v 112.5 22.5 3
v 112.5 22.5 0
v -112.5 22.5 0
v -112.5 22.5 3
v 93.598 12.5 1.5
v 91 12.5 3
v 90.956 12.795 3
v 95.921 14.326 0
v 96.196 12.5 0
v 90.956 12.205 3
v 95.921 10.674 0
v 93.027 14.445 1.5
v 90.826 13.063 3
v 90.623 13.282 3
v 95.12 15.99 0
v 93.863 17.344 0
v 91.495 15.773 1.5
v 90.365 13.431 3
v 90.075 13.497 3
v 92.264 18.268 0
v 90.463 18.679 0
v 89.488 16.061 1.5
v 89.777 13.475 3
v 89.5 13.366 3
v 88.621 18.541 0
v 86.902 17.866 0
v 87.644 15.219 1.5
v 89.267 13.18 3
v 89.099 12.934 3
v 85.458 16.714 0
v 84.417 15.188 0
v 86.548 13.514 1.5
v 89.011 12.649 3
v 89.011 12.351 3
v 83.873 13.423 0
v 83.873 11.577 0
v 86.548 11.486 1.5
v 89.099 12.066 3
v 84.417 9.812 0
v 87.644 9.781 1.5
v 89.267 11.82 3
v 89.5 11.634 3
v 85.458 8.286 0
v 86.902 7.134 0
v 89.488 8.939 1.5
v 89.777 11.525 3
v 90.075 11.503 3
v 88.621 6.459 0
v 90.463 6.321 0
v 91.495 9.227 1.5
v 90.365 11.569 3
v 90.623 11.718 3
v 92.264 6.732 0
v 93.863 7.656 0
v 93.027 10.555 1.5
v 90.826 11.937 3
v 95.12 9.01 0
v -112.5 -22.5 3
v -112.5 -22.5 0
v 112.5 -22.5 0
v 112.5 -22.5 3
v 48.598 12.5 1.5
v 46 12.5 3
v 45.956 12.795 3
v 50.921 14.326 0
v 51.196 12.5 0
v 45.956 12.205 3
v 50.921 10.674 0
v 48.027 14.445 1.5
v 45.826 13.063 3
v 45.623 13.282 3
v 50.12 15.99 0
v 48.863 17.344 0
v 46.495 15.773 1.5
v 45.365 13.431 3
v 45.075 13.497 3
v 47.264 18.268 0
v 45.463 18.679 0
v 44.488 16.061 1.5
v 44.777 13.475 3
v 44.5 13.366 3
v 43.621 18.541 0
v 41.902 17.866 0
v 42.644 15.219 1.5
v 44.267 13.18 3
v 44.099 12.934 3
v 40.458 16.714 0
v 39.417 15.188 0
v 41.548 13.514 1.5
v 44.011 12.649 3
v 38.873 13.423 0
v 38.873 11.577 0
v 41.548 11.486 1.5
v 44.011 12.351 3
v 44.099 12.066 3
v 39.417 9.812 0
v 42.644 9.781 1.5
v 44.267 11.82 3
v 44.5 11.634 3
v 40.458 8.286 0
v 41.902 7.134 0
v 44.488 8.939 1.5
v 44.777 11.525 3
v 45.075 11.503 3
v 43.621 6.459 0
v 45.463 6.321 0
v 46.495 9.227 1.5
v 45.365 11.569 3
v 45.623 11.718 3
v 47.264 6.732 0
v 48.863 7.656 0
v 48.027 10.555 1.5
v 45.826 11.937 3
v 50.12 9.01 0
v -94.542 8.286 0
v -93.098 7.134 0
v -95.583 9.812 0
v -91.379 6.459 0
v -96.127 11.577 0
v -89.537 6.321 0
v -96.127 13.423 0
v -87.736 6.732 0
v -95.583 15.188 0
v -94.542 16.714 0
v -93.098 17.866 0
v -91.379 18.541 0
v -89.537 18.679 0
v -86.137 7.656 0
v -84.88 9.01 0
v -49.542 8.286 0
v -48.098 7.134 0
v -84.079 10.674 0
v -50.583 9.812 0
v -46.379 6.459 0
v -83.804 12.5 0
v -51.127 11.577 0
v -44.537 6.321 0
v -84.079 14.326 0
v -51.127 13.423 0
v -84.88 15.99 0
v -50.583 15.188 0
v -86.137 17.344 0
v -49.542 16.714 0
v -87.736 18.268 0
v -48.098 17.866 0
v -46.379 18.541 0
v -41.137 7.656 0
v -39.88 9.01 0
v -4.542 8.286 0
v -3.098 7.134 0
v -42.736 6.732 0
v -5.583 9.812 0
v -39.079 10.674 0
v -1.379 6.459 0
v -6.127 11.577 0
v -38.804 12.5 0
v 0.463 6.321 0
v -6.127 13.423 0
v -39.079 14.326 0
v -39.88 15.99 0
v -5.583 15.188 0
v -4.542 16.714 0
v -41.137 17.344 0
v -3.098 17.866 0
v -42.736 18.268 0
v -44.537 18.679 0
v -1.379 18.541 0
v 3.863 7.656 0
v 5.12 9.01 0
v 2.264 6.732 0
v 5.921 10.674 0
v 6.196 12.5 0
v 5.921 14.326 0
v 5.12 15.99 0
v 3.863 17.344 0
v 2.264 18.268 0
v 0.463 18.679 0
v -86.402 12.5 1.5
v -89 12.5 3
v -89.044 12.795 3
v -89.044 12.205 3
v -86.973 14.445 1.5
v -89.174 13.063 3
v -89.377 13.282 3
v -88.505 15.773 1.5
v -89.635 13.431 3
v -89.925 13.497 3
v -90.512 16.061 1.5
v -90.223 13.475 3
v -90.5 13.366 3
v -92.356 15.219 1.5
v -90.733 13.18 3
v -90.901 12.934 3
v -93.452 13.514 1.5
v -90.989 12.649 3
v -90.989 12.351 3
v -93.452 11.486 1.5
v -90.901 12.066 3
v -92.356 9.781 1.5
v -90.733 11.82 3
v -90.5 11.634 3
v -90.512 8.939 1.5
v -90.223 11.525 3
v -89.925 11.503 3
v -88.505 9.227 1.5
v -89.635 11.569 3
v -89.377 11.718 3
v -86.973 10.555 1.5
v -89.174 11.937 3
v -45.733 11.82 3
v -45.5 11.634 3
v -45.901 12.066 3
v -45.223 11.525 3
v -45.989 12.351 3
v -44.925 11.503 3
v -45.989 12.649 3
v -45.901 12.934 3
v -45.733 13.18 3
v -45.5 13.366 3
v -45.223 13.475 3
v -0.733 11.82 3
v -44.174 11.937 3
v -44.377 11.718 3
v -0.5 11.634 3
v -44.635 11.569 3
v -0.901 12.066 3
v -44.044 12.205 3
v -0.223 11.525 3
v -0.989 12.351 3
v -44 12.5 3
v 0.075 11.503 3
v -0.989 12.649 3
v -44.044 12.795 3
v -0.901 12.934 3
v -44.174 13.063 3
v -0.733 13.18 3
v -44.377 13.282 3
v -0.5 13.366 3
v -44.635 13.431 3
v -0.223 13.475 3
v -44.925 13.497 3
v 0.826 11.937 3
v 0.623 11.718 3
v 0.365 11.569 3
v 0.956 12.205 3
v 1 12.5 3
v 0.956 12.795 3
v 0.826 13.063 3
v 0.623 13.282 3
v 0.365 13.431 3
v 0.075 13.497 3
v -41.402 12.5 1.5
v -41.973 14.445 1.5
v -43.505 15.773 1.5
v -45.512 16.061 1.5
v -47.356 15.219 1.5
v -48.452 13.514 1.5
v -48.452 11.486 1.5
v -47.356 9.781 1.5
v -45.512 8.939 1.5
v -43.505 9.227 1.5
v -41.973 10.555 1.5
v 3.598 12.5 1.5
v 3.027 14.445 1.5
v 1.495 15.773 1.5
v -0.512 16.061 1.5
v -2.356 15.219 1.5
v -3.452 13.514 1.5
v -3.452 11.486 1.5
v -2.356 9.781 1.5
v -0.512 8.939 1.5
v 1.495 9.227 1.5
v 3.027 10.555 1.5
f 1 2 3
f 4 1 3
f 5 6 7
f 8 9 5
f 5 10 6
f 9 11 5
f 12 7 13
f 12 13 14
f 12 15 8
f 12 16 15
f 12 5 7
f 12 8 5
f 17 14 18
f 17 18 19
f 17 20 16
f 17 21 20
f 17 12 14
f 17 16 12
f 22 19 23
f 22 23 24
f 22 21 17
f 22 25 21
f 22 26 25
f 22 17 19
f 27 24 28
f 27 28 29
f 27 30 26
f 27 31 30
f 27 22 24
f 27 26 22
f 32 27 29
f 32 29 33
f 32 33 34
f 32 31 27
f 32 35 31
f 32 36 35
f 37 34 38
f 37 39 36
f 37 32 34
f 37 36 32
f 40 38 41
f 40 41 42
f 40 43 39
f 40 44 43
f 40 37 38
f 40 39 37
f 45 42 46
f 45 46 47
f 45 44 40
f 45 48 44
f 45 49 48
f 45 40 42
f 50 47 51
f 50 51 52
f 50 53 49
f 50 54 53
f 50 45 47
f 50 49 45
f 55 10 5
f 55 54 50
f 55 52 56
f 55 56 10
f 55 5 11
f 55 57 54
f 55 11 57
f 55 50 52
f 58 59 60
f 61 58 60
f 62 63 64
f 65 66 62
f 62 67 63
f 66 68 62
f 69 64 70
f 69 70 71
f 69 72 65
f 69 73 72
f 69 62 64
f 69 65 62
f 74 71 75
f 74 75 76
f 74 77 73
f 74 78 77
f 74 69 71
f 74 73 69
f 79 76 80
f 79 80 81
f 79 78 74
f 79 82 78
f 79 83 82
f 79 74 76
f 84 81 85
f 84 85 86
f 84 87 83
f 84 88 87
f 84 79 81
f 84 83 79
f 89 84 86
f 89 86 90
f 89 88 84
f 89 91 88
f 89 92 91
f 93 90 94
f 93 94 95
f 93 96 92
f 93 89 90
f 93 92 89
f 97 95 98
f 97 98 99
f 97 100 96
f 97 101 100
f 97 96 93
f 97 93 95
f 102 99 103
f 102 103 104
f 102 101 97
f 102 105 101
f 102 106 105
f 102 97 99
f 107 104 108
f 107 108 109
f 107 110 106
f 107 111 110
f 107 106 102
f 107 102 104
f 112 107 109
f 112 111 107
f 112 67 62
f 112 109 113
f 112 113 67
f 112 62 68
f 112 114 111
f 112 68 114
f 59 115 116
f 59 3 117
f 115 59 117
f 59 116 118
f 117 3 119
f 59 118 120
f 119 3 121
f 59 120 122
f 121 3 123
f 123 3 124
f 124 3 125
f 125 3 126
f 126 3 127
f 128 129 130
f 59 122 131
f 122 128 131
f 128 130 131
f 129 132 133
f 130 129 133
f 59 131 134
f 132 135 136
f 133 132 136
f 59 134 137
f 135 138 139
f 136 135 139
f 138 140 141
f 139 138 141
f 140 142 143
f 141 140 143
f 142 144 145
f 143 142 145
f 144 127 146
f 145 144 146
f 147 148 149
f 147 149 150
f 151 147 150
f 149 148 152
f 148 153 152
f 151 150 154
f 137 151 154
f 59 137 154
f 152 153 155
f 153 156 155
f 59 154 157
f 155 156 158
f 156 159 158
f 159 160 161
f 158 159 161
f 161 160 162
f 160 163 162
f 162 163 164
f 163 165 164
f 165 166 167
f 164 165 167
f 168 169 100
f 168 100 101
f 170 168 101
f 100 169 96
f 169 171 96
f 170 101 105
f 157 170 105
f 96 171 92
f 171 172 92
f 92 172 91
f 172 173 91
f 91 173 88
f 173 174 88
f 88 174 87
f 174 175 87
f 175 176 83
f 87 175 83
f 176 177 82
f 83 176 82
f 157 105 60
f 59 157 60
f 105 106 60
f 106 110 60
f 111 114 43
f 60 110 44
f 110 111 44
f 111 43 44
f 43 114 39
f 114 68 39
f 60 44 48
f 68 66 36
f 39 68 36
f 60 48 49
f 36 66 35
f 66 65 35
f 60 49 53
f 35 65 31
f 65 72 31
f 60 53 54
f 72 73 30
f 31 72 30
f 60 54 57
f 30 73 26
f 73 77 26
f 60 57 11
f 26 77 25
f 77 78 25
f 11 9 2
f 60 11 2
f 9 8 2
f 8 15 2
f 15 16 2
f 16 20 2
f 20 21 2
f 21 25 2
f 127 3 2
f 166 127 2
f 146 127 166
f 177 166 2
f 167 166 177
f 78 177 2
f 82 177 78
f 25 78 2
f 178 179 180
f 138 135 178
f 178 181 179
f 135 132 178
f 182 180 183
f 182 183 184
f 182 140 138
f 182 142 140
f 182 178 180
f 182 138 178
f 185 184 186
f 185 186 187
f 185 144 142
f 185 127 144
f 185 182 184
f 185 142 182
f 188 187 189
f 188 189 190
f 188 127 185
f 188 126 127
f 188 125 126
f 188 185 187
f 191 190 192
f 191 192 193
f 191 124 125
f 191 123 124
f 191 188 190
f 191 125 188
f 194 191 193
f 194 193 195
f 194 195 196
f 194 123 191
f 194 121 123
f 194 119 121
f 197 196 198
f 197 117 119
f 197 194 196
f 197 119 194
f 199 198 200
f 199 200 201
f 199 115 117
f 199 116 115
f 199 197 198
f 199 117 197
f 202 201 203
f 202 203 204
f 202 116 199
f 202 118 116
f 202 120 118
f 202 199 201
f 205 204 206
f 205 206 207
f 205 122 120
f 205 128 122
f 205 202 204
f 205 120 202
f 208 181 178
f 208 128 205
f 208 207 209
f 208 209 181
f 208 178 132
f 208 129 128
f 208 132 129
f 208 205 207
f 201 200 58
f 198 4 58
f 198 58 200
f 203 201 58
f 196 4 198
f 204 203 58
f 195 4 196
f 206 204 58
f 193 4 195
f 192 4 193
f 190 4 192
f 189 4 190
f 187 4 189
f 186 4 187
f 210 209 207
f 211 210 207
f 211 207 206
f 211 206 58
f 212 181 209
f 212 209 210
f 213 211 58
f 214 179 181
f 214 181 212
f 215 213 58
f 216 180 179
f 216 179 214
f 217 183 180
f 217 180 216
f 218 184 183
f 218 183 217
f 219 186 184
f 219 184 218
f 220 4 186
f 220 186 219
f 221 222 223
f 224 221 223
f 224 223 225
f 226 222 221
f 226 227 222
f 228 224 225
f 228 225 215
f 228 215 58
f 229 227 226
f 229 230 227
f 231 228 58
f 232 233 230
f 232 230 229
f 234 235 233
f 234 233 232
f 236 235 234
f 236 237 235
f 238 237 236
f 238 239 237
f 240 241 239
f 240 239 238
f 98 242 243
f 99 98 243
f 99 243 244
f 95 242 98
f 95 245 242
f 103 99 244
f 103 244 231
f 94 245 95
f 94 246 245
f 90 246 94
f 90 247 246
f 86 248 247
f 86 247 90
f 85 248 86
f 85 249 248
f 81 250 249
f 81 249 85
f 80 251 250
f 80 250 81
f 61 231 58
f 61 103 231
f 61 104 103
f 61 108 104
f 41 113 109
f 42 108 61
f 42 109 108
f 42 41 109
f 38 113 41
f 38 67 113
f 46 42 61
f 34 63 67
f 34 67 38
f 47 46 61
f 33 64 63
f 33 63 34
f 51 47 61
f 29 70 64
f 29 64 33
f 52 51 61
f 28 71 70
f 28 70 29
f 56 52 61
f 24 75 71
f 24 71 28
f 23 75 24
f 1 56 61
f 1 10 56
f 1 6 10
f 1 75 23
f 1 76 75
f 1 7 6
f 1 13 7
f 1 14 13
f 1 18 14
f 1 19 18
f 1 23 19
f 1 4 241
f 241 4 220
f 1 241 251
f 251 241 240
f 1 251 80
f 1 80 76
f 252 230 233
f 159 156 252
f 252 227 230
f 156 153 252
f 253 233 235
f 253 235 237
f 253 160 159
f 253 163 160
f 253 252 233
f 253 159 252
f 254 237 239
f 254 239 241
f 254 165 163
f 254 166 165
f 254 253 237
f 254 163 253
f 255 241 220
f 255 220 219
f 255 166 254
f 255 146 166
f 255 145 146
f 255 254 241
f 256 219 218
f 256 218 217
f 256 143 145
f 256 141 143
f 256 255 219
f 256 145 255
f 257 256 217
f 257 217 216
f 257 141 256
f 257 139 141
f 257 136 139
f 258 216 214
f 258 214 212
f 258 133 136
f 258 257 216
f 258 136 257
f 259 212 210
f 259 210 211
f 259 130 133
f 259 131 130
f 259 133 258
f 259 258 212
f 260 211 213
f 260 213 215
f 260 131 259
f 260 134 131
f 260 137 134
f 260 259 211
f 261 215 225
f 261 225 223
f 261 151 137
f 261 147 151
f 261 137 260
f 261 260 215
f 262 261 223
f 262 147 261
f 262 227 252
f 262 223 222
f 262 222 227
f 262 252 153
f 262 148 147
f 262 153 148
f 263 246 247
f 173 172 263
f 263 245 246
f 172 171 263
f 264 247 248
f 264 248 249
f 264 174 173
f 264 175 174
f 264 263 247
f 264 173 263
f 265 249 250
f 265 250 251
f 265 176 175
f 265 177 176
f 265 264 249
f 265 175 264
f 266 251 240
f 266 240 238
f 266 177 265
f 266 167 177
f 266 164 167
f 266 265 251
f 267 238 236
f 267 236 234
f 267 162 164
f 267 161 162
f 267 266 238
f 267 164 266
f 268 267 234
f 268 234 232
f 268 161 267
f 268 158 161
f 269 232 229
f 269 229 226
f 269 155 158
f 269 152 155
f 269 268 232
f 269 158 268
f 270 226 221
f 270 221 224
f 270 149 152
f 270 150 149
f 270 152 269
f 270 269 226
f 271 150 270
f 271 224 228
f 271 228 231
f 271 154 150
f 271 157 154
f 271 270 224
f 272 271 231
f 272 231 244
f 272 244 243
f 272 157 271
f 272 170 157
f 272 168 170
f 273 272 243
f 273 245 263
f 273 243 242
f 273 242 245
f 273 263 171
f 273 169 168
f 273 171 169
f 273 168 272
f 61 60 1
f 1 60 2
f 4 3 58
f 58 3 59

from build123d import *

# Parameters (mm, degrees)
SKETCH1_R           = 1
BOSS_EXTRUDE1_DEPTH = 3
DRAFT3_ANGLE        = -60


with BuildPart() as part:
    # Sketch1 → Boss-Extrude1 (new body)
    with BuildSketch(Plane.XY):
        Polygon((-112.5, 7.5), (-112.5, -22.5), (112.5, -22.5), (112.5, 7.5), (112.5, 22.5), (-112.5, 22.5), align=None)
        with Locations((-90, 12.5)):
            Circle(SKETCH1_R, mode=Mode.SUBTRACT)
        with Locations((-45, 12.5)):
            Circle(SKETCH1_R, mode=Mode.SUBTRACT)
        with Locations((0, 12.5)):
            Circle(SKETCH1_R, mode=Mode.SUBTRACT)
        with Locations((45, 12.5)):
            Circle(SKETCH1_R, mode=Mode.SUBTRACT)
        with Locations((90, 12.5)):
            Circle(SKETCH1_R, mode=Mode.SUBTRACT)
    extrude(amount=BOSS_EXTRUDE1_DEPTH)

    # Draft3
    draft3_faces = [part.faces().sort_by_distance(p)[0] for p in [
        (89, 12.5, 1.5),
        (44, 12.5, 1.5),
        (-1, 12.5, 1.5),
        (-46, 12.5, 1.5),
        (-91, 12.5, 1.5),
    ]]
    draft(draft3_faces, Plane.XY.offset(3), DRAFT3_ANGLE)


solid = part.part
